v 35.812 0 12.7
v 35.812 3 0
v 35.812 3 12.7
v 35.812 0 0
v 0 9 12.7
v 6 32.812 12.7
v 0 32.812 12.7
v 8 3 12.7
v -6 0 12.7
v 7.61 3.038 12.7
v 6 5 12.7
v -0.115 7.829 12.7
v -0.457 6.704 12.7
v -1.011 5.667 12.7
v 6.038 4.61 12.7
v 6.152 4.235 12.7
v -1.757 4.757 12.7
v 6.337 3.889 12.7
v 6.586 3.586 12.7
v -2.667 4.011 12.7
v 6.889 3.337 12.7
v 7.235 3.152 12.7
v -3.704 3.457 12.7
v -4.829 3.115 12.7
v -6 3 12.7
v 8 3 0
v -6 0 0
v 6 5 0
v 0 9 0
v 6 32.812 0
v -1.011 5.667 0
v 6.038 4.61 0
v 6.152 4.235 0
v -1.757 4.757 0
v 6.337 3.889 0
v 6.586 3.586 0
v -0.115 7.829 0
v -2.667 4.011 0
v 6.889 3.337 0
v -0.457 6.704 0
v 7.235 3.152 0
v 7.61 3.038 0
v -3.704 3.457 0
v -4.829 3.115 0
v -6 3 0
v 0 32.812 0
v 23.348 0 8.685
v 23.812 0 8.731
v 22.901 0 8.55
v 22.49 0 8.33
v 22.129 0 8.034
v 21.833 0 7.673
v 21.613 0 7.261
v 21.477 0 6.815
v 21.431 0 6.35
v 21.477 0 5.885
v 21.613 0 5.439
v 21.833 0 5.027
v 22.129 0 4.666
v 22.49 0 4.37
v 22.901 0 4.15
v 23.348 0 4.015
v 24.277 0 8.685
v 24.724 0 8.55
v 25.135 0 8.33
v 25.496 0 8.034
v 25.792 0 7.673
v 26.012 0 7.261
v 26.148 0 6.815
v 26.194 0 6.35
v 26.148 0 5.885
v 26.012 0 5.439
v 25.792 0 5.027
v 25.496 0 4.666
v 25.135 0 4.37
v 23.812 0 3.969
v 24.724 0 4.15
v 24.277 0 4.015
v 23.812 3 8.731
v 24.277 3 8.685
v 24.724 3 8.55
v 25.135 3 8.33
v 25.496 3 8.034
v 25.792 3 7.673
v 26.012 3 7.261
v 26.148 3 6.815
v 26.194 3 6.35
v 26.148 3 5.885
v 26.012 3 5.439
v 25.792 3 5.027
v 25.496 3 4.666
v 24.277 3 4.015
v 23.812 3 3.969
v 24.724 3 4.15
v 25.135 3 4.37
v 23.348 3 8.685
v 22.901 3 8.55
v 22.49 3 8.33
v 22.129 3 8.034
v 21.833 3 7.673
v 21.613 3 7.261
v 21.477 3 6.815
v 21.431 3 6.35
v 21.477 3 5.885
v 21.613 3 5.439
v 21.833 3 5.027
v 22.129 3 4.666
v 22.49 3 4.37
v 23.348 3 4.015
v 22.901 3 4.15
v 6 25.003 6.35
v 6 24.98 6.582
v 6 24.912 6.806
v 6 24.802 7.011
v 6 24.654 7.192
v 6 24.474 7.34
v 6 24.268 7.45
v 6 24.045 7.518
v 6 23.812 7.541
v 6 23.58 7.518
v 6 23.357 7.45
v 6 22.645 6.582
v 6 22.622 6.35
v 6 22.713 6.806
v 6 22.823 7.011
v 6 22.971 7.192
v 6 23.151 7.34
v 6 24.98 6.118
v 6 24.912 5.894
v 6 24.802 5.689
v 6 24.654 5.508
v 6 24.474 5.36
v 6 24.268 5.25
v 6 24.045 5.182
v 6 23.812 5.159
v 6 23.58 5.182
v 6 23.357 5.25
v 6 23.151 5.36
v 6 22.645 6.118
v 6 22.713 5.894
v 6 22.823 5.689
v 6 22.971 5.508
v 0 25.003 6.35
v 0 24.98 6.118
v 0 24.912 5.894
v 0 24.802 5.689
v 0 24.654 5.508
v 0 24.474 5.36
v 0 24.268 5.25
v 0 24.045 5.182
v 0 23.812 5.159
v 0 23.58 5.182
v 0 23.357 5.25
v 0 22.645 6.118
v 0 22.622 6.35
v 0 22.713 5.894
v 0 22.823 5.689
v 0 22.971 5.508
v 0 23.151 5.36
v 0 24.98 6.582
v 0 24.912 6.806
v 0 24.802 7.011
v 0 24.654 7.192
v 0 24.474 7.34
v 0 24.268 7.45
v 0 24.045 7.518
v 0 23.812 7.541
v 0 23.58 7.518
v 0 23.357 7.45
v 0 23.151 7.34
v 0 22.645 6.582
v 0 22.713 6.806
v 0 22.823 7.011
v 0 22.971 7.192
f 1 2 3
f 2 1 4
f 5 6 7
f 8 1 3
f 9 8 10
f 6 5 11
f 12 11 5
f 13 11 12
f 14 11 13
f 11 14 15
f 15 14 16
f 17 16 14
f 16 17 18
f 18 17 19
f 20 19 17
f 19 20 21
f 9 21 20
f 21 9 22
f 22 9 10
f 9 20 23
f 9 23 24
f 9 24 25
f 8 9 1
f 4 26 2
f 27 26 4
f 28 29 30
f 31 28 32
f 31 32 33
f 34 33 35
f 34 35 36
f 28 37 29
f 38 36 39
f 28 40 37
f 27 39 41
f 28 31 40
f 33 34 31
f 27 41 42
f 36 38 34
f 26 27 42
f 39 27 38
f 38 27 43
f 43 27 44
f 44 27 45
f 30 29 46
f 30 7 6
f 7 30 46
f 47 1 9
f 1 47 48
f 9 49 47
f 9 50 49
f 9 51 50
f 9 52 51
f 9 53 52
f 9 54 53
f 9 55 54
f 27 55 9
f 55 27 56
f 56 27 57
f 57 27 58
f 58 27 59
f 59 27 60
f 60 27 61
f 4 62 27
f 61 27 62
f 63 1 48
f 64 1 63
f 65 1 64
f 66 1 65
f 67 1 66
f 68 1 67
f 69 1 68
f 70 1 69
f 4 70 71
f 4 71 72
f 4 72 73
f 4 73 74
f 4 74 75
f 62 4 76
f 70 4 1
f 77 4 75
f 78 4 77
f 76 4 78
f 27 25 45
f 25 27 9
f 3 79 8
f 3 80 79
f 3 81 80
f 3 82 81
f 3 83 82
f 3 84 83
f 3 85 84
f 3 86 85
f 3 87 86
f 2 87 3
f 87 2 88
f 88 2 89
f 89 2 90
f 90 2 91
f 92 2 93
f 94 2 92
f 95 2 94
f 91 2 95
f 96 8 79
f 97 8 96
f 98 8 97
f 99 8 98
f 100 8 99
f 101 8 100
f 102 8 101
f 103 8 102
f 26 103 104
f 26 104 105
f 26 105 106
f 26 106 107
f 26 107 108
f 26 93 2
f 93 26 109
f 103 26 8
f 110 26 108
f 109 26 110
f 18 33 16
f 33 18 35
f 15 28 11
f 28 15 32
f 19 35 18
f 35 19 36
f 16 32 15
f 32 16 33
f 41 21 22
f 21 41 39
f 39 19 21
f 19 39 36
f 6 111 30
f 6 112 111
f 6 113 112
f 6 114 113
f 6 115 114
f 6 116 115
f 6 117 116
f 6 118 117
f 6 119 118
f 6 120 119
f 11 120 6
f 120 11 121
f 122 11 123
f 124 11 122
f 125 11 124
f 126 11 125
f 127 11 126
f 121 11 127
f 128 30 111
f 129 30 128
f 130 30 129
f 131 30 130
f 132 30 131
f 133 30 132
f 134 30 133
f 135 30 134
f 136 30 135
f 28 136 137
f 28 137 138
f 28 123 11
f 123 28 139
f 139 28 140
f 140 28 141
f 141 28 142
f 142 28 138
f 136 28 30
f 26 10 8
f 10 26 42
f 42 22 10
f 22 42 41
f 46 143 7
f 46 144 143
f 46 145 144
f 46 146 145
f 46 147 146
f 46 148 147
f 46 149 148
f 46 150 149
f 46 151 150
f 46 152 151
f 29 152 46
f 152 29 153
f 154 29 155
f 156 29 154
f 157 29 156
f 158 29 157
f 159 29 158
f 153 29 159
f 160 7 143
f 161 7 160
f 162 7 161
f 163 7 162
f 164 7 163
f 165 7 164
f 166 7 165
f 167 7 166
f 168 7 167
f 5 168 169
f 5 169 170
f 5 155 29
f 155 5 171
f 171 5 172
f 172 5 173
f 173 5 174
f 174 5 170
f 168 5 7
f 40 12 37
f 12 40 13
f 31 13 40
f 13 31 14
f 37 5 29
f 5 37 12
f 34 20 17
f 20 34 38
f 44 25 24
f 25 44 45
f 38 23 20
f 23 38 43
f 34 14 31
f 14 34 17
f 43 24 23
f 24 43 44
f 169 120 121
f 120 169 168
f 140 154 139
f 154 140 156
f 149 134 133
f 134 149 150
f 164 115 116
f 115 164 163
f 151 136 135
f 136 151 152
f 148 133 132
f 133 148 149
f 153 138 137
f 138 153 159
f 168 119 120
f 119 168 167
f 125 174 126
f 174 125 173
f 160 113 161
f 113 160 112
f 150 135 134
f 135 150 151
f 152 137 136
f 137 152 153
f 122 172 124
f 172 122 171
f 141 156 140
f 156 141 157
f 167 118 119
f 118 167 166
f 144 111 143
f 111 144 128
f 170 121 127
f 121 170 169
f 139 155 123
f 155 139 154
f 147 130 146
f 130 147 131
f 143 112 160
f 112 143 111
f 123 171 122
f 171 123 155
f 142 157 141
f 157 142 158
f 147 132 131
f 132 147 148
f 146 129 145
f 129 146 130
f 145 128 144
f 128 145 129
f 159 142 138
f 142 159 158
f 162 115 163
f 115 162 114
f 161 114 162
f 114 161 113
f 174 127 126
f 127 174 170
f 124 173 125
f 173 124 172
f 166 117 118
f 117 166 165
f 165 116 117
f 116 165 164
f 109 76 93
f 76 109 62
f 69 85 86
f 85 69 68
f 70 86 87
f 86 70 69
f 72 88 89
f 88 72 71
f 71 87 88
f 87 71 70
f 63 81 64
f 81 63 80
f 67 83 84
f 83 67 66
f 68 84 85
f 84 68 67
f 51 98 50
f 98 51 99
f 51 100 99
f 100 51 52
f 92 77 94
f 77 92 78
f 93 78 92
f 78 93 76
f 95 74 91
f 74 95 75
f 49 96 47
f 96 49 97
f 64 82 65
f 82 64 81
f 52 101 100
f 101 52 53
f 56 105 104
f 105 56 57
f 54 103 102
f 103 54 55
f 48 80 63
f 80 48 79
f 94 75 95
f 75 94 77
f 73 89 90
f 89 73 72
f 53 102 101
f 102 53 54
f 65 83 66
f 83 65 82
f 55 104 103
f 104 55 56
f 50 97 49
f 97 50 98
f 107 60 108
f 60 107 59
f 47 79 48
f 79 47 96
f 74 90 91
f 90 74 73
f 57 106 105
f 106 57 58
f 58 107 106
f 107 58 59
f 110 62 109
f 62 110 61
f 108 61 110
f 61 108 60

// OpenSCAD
in = 25.4;

wall = 3;
leg = 15/16*in;

hole1 = 3/32*in/2;
hole2 = 3/16*in/2;

thick = 1/2*in;

mount();
$fn=32;

module mount(){
	mrad = 2;
	difference(){
		union(){
			cube([leg+wall*4,leg+wall*3,thick]);
			translate([-wall*2,0,0]) cube([wall*2+.1,leg+wall*3,thick]);
		}

		translate([wall*2+mrad,wall+mrad,-.1]) minkowski(){
			cube([leg+wall*3, leg+wall*3, thick]);
			cylinder(r=mrad, h=.2);
		}

		translate([-wall*4-wall*2,wall+wall*2,-.1]) minkowski(){
			cube([wall*4, leg+wall*3, thick]);
			cylinder(r=wall*2, h=.2);
		}

		//hole1
		translate([0,leg, thick/2]) rotate([0,90,0]) cylinder(r=hole1, h=20, center=true);

		//hole2
		translate([leg,0, thick/2]) rotate([90,0,0]) cylinder(r=hole2, h=20, center=true);
	}
}
